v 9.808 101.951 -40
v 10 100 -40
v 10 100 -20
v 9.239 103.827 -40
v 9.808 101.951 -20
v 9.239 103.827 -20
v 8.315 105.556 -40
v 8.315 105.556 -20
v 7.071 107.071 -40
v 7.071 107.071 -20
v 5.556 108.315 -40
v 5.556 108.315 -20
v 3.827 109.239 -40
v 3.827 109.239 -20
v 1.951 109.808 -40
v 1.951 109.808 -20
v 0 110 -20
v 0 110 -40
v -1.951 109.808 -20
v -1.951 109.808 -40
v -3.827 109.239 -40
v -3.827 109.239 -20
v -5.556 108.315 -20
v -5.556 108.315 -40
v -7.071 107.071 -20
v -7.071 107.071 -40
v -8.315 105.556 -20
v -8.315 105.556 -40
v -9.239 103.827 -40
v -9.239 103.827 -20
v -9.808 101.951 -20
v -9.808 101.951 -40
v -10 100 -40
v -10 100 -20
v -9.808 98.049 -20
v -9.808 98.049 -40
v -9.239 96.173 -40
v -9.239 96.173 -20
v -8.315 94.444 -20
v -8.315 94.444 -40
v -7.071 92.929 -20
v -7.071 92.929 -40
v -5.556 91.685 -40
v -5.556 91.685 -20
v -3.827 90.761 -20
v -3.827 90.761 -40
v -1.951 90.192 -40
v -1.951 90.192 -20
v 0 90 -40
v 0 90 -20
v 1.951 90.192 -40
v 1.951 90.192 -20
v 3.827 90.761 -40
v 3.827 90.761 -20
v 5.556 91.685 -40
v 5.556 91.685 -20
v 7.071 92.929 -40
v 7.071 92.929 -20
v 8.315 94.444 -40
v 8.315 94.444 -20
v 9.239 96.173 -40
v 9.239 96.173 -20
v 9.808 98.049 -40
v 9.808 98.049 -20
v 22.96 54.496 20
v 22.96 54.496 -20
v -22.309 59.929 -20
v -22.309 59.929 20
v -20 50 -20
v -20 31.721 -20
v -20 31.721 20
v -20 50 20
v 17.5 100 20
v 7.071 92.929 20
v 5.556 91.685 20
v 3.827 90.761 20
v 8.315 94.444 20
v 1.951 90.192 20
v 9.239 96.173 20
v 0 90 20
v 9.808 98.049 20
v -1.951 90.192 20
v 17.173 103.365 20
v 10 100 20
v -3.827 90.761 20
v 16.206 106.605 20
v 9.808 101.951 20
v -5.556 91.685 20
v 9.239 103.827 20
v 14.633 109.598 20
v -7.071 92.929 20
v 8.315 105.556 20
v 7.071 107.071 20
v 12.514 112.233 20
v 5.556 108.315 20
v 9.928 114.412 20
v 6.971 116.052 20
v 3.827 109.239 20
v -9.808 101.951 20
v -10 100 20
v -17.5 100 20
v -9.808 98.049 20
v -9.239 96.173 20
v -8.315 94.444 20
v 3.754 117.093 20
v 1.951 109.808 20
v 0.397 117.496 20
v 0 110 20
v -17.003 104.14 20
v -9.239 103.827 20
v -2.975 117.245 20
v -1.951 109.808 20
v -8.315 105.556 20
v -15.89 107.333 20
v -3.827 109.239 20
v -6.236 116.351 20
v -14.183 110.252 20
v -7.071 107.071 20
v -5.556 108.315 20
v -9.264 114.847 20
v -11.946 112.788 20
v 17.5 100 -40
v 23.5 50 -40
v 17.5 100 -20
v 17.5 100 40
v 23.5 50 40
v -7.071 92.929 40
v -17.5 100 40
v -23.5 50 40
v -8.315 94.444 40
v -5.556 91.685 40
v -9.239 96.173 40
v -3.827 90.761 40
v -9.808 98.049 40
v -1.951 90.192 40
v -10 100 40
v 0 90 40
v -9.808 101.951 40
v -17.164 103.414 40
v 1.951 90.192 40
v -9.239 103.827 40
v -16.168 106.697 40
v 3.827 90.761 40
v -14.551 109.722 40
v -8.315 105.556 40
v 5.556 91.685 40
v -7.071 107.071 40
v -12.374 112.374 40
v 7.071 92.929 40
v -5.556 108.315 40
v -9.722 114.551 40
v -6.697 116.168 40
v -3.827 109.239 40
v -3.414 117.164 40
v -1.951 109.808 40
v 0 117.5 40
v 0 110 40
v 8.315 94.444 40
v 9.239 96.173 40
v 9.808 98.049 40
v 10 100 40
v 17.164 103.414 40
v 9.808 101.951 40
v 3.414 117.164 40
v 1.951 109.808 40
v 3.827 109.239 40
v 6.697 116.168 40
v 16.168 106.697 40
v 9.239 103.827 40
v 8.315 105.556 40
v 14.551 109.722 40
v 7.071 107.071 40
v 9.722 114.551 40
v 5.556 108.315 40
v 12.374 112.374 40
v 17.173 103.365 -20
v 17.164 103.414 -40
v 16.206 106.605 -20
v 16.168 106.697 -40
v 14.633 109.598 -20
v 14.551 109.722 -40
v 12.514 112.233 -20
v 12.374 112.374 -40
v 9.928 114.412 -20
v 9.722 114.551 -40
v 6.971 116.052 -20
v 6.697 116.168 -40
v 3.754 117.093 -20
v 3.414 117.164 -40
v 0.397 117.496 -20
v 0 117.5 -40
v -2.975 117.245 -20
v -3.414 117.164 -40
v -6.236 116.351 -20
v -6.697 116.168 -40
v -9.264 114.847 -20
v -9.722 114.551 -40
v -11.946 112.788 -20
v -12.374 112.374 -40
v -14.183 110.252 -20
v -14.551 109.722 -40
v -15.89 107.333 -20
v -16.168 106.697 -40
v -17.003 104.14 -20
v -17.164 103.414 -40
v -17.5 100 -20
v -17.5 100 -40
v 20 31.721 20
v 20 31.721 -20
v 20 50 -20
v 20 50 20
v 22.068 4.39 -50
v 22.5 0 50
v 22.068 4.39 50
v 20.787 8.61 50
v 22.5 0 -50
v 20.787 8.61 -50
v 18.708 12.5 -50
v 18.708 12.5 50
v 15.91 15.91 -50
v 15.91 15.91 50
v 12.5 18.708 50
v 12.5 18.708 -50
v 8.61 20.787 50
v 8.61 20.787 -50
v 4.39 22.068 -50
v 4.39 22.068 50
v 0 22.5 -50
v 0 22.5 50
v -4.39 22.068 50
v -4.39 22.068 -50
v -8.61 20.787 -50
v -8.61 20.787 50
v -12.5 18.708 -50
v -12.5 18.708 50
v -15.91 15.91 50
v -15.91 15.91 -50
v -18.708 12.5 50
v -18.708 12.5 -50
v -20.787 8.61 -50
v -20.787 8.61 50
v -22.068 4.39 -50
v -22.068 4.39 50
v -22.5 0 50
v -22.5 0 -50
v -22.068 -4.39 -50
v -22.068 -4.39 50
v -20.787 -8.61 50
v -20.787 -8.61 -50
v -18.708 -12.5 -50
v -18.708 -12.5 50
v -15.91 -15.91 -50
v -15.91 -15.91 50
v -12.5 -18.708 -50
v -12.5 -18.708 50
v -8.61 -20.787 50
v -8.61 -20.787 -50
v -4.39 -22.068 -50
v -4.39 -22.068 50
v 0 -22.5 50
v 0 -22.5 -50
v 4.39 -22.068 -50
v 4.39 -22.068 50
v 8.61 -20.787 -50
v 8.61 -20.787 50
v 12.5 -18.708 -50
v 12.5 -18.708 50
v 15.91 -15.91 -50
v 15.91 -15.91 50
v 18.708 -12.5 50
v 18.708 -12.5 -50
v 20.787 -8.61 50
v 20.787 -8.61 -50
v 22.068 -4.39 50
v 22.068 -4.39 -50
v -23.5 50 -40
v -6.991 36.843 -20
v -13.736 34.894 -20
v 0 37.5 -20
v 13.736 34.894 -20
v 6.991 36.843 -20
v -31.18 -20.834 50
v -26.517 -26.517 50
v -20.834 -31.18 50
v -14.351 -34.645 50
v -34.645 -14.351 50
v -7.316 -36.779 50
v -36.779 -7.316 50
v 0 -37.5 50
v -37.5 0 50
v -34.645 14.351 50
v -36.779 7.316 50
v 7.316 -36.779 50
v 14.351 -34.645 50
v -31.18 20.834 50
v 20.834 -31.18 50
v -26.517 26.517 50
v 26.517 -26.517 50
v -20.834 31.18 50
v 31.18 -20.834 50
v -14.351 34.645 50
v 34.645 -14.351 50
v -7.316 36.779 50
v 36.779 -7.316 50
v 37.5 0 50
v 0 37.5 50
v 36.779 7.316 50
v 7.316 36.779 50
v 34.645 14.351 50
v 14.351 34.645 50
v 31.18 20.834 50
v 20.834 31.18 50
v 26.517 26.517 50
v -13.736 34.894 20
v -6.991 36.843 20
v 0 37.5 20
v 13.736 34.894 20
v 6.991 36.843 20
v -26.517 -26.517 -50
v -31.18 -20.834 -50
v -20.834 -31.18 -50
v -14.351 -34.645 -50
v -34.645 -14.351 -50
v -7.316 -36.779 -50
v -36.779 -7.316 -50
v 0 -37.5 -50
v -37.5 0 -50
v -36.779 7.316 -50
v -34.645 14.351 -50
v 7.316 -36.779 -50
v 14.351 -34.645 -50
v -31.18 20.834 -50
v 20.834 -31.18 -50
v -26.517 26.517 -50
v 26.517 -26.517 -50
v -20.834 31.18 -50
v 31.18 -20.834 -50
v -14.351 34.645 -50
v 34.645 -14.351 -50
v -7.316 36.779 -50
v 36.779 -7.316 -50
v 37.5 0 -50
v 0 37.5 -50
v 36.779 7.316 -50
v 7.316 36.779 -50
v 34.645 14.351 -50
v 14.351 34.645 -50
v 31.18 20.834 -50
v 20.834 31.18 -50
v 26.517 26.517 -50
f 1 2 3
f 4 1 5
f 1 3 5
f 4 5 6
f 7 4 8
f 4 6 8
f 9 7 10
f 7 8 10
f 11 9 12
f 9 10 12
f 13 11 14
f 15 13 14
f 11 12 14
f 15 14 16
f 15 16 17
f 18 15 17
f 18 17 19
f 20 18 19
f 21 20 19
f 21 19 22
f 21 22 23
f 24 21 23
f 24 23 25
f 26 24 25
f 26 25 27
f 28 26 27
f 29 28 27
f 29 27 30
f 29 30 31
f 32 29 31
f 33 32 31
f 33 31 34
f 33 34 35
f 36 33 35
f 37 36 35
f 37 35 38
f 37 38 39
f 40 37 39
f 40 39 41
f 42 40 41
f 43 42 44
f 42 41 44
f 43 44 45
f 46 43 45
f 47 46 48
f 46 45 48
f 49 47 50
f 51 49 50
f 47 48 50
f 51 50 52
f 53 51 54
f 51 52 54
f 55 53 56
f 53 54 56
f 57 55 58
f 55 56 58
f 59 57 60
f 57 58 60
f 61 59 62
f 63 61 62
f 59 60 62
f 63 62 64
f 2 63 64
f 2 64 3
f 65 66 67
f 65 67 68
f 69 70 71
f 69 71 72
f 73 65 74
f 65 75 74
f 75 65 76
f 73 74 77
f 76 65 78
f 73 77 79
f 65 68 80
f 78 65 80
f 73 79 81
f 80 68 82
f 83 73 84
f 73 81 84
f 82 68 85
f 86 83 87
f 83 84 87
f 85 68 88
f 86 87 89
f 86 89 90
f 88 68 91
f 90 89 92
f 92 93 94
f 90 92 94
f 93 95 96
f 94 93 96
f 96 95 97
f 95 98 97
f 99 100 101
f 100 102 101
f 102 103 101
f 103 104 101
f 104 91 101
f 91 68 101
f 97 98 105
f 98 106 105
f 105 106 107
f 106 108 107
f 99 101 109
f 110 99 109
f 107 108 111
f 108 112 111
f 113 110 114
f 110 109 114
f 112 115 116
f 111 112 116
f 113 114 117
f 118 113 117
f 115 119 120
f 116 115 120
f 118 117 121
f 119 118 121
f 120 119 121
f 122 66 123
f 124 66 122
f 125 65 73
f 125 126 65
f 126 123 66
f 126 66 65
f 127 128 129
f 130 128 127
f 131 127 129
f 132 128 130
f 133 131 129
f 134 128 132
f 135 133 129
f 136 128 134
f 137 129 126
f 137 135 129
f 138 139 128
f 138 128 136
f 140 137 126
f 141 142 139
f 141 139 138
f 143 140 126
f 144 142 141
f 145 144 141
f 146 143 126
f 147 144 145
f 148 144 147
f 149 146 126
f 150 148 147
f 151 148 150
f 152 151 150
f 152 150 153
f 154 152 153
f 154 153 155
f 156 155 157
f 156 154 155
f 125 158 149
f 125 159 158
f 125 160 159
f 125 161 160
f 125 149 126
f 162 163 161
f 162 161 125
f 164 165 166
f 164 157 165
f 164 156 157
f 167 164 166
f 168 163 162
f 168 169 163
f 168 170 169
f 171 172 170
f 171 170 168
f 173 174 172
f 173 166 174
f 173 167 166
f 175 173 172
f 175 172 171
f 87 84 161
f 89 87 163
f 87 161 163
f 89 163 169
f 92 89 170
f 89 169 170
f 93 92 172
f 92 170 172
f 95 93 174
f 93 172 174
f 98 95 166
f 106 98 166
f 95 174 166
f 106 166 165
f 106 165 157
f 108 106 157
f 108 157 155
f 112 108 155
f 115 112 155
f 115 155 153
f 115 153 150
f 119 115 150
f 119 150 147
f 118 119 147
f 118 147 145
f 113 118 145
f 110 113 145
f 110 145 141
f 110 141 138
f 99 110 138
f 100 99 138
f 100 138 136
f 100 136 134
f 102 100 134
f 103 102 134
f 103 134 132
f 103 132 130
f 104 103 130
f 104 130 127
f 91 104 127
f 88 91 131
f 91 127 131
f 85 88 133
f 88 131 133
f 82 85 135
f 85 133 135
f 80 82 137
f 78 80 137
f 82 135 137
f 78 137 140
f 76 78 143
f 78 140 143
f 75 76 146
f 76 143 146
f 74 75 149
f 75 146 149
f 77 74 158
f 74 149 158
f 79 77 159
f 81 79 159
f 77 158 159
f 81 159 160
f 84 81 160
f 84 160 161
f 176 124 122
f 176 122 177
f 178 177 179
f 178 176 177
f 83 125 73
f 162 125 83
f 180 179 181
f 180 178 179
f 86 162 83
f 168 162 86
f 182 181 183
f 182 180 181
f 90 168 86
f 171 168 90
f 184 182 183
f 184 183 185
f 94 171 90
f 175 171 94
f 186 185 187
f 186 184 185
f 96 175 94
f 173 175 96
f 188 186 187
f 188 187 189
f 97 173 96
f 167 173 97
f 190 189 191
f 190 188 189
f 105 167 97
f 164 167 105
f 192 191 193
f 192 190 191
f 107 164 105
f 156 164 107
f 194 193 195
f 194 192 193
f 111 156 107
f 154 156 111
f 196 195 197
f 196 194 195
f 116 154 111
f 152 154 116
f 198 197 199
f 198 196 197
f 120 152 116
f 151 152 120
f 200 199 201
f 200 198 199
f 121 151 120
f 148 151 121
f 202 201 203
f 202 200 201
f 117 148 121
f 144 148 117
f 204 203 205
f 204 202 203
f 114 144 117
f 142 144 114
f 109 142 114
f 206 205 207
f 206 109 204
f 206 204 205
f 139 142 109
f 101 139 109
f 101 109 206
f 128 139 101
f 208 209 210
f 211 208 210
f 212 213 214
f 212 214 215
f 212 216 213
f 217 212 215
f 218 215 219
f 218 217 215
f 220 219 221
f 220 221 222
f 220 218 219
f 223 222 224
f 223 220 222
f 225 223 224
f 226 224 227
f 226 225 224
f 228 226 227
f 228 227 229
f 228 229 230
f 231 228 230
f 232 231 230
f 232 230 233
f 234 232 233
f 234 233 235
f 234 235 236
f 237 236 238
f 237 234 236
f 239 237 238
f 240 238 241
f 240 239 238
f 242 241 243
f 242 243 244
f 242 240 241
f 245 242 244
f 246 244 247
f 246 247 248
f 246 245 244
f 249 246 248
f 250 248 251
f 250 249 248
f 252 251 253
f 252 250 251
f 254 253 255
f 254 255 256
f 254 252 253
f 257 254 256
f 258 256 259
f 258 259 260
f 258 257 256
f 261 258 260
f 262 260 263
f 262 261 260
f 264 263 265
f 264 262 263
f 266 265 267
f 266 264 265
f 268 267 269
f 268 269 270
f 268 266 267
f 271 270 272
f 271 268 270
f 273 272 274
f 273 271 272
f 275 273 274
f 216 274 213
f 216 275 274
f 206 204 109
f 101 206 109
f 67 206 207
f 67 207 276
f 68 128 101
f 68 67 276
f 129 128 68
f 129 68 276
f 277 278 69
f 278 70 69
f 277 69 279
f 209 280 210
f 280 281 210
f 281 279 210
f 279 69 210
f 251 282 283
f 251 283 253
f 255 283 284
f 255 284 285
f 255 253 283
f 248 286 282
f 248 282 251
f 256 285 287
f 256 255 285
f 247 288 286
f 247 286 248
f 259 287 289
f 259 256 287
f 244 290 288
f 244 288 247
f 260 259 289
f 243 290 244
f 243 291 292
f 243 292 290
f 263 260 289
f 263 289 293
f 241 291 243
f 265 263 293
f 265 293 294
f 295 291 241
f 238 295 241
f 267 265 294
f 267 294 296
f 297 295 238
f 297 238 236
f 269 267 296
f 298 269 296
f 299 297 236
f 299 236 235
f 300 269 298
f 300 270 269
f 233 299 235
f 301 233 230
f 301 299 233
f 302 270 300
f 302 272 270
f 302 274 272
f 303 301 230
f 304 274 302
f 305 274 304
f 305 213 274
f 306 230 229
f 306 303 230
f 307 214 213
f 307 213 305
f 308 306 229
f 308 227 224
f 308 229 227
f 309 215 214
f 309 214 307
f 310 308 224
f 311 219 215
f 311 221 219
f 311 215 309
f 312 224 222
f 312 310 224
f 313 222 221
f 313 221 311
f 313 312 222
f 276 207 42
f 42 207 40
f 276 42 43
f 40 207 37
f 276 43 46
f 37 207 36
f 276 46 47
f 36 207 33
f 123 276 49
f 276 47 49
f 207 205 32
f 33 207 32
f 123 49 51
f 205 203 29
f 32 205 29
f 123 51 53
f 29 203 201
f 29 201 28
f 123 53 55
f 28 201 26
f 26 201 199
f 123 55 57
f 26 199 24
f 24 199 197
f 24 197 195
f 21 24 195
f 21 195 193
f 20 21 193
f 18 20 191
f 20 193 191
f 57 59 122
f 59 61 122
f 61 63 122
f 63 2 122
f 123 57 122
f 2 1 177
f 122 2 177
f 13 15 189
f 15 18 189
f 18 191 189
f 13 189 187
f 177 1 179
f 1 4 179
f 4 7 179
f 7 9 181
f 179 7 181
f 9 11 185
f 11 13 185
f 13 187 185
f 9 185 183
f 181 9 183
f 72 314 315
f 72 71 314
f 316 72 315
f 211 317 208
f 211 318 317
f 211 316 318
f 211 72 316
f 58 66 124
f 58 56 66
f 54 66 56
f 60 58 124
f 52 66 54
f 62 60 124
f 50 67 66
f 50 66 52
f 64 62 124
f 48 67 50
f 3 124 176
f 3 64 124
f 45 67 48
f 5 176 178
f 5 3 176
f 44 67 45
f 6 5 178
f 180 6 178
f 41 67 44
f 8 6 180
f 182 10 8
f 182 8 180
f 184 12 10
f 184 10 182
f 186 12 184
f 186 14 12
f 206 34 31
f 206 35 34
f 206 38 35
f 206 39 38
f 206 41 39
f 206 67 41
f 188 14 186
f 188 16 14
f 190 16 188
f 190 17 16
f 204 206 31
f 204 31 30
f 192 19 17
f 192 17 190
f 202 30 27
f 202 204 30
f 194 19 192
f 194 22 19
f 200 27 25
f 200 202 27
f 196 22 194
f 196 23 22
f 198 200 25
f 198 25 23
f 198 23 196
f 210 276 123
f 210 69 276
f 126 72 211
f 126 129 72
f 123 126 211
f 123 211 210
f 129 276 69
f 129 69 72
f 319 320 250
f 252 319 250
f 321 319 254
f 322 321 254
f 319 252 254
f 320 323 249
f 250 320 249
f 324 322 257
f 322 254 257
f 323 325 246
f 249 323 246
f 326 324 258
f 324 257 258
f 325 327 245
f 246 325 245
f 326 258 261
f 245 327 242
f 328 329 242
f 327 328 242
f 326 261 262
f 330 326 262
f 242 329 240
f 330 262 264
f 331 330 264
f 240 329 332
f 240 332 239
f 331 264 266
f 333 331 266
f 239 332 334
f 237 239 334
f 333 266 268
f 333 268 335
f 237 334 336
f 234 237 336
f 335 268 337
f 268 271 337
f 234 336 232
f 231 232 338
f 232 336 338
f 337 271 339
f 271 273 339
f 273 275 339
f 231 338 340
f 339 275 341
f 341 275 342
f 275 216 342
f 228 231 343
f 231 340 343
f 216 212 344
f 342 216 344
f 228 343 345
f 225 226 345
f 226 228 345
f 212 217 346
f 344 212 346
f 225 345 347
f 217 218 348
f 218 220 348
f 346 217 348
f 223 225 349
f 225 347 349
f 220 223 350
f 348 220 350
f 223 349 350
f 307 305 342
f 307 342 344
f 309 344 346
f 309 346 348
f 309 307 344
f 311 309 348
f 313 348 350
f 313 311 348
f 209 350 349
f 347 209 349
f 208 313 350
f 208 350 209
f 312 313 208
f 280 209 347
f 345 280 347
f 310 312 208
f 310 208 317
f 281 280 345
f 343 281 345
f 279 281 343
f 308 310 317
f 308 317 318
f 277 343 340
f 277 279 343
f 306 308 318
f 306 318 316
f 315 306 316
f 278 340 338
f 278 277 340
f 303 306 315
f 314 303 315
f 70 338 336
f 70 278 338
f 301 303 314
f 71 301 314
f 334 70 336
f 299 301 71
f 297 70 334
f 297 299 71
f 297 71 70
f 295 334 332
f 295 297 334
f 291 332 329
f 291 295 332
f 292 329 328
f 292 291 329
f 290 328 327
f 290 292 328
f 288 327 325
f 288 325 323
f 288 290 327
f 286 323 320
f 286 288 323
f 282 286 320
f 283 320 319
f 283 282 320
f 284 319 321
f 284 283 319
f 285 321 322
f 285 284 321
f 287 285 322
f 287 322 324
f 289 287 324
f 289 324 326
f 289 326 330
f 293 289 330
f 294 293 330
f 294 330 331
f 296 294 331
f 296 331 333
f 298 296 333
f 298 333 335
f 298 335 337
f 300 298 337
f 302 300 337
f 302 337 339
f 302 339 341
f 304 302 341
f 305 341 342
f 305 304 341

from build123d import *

# Parameters (mm, degrees)
SKETCH1_R           = 37.5
SKETCH1_R_2         = 22.5
BOSS_EXTRUDE1_DEPTH = 50
BOSS_EXTRUDE3_DEPTH = 40
SKETCH10_R          = 10
CUT_EXTRUDE5_DEPTH  = 91
SKETCH11_W          = 40
SKETCH11_H          = 59.943754609
CUT_EXTRUDE6_DEPTH  = 71.990693952
SKETCH12_W          = 40
SKETCH12_H          = 20
BOSS_EXTRUDE8_DEPTH = 20


with BuildPart() as part:
    # Sketch1 → Boss-Extrude1 (new body, symmetric)
    with BuildSketch(Plane.XY):
        Circle(SKETCH1_R)
        Circle(SKETCH1_R_2, mode=Mode.SUBTRACT)
    extrude(amount=BOSS_EXTRUDE1_DEPTH, both=True)



with BuildPart() as body_2:
    # Sketch3 → Boss-Extrude3 (new body, symmetric)
    with BuildSketch(Plane.XY):
        with BuildLine():
            Line((-23.5, 50), (23.5, 50))
            Line((23.5, 50), (17.5, 100))
            ThreePointArc((17.5, 100), (0, 117.5), (-17.5, 100))
            Line((-17.5, 100), (-23.5, 50))
        make_face()
    extrude(amount=BOSS_EXTRUDE3_DEPTH, both=True)

    # Sketch10 → Cut-Extrude5 (cut, through all)
    with BuildSketch(Plane.XY.offset(40)):
        with Locations((0, 100)):
            Circle(SKETCH10_R)
    extrude(amount=-CUT_EXTRUDE5_DEPTH, mode=Mode.SUBTRACT)

    # Sketch11 → Cut-Extrude6 (cut, through all)
    with BuildSketch(Plane(origin=(-29.081230284, 3.489747634, 0), x_dir=(0, 0, 1), z_dir=(-0.992876838, 0.119145221, 0))):
        with Locations((0, 86.815806545)):
            Rectangle(SKETCH11_W, SKETCH11_H)
    extrude(amount=-CUT_EXTRUDE6_DEPTH, mode=Mode.SUBTRACT)


with BuildPart() as part_1:
    add(part.part)

    add(body_2.part)  # Boss-Extrude8 merges body 2
    # Sketch12 → Boss-Extrude8 (add, symmetric)
    with BuildSketch(Plane.XY):
        with Locations((0, 40)):
            Rectangle(SKETCH12_W, SKETCH12_H)
    extrude(amount=BOSS_EXTRUDE8_DEPTH, both=True)


solid = part_1.part
